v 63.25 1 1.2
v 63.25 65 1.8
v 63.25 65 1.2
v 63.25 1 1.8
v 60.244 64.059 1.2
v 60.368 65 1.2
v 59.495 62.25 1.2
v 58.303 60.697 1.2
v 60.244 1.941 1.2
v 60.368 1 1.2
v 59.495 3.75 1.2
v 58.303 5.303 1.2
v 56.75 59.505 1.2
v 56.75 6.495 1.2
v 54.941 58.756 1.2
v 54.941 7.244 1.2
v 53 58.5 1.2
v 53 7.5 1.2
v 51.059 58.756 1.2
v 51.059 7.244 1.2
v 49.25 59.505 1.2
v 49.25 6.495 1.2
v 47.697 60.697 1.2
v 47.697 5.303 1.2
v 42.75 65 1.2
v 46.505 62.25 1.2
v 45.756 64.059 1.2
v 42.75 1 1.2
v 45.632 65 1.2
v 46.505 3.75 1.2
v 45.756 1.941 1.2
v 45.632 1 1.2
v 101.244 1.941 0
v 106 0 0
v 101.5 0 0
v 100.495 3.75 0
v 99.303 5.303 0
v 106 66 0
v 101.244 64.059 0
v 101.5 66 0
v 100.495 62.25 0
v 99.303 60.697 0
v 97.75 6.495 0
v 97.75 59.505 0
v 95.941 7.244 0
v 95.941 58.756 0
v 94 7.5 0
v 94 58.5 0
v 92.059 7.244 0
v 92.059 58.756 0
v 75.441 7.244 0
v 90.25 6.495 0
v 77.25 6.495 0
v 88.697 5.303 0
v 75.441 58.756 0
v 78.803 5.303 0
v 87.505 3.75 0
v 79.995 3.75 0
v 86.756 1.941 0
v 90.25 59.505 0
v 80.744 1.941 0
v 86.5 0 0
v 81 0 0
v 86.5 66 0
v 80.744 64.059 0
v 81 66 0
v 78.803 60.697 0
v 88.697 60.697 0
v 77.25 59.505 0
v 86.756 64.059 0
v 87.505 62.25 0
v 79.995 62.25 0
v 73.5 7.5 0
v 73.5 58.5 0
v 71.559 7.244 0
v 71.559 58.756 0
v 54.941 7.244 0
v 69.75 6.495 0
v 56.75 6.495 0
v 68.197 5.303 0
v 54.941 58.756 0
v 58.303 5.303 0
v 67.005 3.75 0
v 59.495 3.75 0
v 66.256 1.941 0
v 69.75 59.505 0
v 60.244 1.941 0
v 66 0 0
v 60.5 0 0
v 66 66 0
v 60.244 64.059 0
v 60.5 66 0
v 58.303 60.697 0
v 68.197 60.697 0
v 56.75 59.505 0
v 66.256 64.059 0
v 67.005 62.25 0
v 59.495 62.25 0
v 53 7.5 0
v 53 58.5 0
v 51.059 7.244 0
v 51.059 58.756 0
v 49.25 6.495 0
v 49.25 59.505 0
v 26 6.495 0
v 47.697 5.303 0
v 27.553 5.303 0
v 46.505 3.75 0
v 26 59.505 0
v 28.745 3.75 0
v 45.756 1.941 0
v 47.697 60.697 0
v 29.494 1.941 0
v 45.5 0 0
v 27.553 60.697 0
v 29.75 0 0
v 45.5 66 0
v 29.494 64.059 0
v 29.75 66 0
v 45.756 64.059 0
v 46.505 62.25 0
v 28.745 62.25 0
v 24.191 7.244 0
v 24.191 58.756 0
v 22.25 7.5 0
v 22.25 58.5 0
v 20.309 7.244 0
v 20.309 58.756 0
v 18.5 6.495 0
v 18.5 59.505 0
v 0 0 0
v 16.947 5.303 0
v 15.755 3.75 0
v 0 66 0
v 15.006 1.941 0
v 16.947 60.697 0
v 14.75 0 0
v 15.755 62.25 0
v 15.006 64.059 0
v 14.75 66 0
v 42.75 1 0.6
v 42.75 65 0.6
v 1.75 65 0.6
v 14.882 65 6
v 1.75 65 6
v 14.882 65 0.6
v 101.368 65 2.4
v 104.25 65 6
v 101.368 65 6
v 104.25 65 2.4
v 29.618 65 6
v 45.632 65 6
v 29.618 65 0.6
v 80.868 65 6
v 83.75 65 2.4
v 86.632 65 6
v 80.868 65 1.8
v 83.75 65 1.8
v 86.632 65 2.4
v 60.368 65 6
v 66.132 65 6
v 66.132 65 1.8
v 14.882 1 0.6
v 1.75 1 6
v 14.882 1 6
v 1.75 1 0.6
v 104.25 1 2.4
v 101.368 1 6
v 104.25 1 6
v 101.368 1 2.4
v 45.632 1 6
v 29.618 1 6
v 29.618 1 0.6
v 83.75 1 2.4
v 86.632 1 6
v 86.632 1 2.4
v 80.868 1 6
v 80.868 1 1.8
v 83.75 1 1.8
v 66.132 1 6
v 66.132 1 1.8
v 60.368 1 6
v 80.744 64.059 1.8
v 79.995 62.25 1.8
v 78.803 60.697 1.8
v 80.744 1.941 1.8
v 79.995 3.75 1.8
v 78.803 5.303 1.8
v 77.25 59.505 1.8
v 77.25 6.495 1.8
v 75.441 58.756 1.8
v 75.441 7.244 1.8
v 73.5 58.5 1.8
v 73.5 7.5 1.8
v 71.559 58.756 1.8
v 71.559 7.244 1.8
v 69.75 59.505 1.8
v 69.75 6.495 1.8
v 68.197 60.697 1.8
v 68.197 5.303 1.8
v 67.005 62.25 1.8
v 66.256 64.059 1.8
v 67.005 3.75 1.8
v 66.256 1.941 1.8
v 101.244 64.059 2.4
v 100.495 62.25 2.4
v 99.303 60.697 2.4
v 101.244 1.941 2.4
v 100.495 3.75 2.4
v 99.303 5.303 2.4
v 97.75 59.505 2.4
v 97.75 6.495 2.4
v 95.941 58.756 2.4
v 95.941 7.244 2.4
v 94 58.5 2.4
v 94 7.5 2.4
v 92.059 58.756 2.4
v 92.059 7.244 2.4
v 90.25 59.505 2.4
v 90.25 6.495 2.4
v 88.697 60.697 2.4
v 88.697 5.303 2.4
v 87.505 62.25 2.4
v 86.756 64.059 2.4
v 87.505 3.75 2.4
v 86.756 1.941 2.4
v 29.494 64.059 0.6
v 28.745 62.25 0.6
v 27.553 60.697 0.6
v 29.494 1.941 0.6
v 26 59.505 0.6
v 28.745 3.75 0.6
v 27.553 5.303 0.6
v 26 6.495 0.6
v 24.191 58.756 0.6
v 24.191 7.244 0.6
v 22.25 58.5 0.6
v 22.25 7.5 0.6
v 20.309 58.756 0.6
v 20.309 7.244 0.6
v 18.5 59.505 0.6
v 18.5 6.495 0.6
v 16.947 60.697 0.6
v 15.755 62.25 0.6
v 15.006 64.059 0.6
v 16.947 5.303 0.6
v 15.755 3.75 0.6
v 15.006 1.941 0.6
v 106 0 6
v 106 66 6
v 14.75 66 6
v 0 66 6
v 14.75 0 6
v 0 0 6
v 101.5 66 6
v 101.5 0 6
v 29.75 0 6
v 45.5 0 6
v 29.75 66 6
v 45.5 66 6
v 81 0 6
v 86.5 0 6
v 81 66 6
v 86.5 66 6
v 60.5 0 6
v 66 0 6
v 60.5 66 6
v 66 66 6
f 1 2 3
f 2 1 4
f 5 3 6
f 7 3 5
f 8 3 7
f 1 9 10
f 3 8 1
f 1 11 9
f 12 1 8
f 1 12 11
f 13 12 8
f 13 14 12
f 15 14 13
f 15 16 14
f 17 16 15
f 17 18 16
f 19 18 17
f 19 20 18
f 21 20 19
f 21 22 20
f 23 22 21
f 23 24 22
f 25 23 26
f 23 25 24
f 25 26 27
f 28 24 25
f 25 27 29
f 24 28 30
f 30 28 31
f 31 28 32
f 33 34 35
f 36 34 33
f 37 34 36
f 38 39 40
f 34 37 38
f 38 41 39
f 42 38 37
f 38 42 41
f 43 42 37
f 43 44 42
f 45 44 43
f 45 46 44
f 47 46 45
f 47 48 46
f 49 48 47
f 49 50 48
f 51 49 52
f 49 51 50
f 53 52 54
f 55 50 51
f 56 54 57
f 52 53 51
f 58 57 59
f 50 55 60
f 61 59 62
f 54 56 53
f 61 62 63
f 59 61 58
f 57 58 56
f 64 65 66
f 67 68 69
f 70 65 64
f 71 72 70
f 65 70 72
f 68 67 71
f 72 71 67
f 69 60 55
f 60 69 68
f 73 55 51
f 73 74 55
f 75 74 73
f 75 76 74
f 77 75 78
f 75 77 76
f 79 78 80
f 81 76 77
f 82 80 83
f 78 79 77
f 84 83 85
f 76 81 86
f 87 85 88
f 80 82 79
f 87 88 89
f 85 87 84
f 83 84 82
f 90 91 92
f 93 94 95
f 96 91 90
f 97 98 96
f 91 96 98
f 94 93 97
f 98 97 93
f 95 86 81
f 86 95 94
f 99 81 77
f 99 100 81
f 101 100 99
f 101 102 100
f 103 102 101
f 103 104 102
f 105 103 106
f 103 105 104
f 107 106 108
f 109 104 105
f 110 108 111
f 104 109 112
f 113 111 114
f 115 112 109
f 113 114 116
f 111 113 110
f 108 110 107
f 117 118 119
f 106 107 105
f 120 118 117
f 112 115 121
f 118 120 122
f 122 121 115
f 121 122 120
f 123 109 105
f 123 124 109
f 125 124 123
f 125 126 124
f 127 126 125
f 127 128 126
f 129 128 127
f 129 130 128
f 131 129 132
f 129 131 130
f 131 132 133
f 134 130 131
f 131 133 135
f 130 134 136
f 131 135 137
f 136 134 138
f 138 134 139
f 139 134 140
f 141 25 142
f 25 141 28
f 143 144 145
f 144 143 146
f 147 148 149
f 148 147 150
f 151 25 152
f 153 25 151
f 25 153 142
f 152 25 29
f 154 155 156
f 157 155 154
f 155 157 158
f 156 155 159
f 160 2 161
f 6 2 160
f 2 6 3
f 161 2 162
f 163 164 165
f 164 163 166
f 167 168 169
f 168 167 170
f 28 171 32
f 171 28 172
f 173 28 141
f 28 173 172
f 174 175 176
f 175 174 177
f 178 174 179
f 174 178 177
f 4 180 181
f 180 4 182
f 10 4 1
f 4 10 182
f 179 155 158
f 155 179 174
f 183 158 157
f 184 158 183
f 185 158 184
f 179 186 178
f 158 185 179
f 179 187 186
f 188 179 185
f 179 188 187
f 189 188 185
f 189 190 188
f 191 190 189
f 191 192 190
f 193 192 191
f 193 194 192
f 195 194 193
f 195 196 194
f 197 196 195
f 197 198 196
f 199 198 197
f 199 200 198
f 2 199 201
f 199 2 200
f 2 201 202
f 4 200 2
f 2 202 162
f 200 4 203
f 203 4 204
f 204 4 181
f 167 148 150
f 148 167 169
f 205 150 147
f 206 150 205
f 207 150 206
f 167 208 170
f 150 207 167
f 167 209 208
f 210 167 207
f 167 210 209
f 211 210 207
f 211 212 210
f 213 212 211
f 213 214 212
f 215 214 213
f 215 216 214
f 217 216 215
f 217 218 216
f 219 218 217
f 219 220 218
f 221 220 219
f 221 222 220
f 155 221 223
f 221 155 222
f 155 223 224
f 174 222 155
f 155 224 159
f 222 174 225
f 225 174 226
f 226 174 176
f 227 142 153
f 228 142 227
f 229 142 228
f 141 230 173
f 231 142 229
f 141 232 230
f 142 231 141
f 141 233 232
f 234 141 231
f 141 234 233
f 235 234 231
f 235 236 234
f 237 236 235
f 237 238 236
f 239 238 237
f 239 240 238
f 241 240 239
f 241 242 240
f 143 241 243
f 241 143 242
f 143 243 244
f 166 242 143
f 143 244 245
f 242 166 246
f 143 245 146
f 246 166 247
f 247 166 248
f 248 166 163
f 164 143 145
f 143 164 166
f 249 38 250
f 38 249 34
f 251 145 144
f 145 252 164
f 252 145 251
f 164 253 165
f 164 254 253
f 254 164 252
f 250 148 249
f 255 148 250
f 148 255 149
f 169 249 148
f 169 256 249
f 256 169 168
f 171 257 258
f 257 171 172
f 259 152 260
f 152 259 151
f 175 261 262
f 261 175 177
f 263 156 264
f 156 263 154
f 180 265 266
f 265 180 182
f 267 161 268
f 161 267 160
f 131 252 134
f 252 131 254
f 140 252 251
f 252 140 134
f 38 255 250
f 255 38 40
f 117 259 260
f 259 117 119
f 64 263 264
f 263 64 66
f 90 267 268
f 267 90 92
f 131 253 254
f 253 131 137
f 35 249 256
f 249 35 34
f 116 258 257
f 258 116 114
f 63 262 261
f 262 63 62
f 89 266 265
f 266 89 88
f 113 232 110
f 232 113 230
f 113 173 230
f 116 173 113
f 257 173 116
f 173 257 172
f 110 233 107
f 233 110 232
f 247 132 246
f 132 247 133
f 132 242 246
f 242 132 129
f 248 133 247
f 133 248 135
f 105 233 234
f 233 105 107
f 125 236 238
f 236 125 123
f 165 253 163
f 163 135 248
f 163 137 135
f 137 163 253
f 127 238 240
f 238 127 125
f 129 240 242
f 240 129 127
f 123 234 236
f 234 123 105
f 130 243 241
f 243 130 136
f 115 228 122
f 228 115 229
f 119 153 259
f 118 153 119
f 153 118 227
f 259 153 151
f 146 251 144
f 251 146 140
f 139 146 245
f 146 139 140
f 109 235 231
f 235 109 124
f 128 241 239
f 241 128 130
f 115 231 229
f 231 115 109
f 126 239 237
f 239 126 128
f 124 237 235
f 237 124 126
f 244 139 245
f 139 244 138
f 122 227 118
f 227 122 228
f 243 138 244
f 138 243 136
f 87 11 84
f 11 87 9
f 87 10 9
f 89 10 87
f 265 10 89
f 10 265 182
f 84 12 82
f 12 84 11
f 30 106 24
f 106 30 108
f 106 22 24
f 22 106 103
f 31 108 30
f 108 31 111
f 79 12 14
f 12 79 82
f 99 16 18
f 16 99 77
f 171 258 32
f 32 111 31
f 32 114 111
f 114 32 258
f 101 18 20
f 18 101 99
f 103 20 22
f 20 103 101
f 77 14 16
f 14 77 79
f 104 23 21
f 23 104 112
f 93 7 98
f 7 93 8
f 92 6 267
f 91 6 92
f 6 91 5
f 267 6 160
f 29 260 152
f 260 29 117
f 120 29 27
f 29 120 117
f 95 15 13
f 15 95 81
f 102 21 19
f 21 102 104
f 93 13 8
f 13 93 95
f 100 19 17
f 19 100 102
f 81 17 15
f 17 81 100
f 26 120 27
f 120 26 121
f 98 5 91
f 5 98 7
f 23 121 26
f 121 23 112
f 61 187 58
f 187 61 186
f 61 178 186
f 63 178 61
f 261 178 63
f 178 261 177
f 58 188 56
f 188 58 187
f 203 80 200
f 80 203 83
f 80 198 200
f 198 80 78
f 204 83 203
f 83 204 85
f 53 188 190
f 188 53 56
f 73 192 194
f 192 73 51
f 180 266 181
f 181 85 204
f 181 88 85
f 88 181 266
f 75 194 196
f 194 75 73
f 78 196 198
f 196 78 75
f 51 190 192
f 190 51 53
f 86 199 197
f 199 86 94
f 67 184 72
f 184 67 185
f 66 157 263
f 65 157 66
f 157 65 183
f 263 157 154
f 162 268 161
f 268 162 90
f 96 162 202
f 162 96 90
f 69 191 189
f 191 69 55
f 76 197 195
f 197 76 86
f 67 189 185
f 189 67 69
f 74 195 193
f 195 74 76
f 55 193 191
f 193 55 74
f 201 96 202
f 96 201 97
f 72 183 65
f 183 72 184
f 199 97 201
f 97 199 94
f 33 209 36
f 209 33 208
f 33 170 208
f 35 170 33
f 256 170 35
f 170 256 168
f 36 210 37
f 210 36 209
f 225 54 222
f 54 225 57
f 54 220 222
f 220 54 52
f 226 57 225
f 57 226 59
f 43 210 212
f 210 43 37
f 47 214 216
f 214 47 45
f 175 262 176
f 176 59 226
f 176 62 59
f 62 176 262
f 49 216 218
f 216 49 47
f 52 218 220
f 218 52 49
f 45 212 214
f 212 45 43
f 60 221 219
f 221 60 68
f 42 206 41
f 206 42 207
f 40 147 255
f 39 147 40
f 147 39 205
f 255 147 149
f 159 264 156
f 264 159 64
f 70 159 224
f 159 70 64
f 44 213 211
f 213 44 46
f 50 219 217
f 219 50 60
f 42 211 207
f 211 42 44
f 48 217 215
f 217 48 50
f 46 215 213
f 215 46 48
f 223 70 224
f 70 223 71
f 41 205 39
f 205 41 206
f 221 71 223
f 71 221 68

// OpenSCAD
// file: damageInsert.scad
cardWidth = 41;
cardDepth = 64;
widthOffsetPercent = .5;
depthOffsetPercent = .55;
offsetCardWidth = cardWidth*widthOffsetPercent;
offsetCardDepth = cardDepth*depthOffsetPercent;
cardHeight = .3;
stepHeight = 2*cardHeight;

function getCardWidth() = cardWidth;
function getCardDepth() = cardDepth;
function getOffsetCardWidth() = offsetCardWidth;
function getOffsetCardDepth() = offsetCardDepth;
function getInsertStepHeight() = stepHeight;
function getColor(number) = [.2*number, 0*number, .2*number,];
function getMinOuterDimensions(direction, numberOfCards, insertTolerance) = direction == "depth"
  ? [
      cardWidth + insertTolerance,
      cardDepth + (numberOfCards - 1)*offsetCardDepth + insertTolerance,
      (numberOfCards + 1)*stepHeight + insertTolerance
  ]
  : [
    cardWidth + (numberOfCards - 1)*offsetCardWidth + insertTolerance,
    cardDepth + insertTolerance,
    (numberOfCards + 1)*stepHeight + insertTolerance,
  ];

module damageInsert (
  numberOfCards,
  direction = "depth",
  insertTolerance = 1
) {
  cube([cardWidth, cardDepth, stepHeight]);

  numberOfAdditionalCards = numberOfCards - 1;
  for (i = [1: numberOfAdditionalCards]) {
    color(getColor(i))
    if (direction == "depth") {
      translate([0, cardDepth + (i - 1)*offsetCardDepth, 0])
      cube([cardWidth, offsetCardDepth, (i+1)*stepHeight]);
    } else {
      translate([cardWidth + (i - 1)*offsetCardWidth, 0, 0])
      cube([offsetCardWidth, cardDepth, (i+1)*stepHeight]);
    }
  }

  echo("Min Outer Dimensions", getMinOuterDimensions(direction, numberOfCards, insertTolerance));
}

damageInsert(4, "width");
// file: ../../standard-organizers/container.scad
function defaultBottomThickness() = 1;
function defaultBottomClearance() = 16;
function defaultMinWallThickness() = 1;
function defaultWallClearance() = 16;
function defaultSideMultiple() = 2;

function getOuterWidth(innerWidth, minWallThickness, sideMultiple) = ceil((innerWidth + 2*minWallThickness)/sideMultiple)*sideMultiple;
function getOuterDepth(innerDepth, minWallThickness, sideMultiple) = ceil((innerDepth + 2*minWallThickness)/sideMultiple)*sideMultiple;

function getSideWallThickness(innerWidth, minWallThickness, sideMultiple) = (getOuterWidth(innerWidth, minWallThickness, sideMultiple) - innerWidth)/2;
function getFrontWallThickness(innerDepth, minWallThickness, sideMultiple) = (getOuterDepth(innerDepth, minWallThickness, sideMultiple) - innerDepth)/2;

function getFrontHoleWidth(innerWidth, frontWallClearance) = max(5, innerWidth - 2*frontWallClearance);
function getSideHoleDepth(innerDepth, sideWallClearance) = max(5, innerDepth - 2*sideWallClearance);

function getFrontHole(innerWidth, innerDepth, outerHeight, bottomClearance, minWallThickness, frontWallClearance, sideMultiple) = [
  [
    getSideWallThickness(innerWidth, minWallThickness, sideMultiple) + (innerWidth/2 - getFrontHoleWidth(innerWidth, frontWallClearance)/2),
    0,
    bottomClearance
  ],
  [
    getFrontHoleWidth(innerWidth, frontWallClearance),
    getOuterDepth(innerDepth, minWallThickness, sideMultiple),
    outerHeight
  ]
];

function getSideHole(innerWidth, innerDepth, outerHeight, bottomClearance, minWallThickness, sideWallClearance, sideMultiple) = [
  [
    0,
    getFrontWallThickness(innerDepth, minWallThickness, sideMultiple) + (innerDepth/2 - getSideHoleDepth(innerDepth, sideWallClearance)/2),
    bottomClearance
  ],
  [
    getOuterWidth(innerWidth, minWallThickness, sideMultiple),
    getSideHoleDepth(innerDepth, sideWallClearance),
    outerHeight
  ]
];

module container (
  innerWidth,
  innerDepth,
  outerHeight,
  type = "solid",
  bottomThickness = defaultBottomThickness(),
  bottomClearance = defaultBottomClearance(),
  minWallThickness = defaultMinWallThickness(),
  frontWallClearance = defaultWallClearance(),
  sideWallClearance = defaultWallClearance(),
  sideMultiple = defaultSideMultiple()
) {
  innerHeight = outerHeight - bottomThickness;

  outerWidth = getOuterWidth(innerWidth, minWallThickness, sideMultiple);
  outerDepth = getOuterDepth(innerDepth, minWallThickness, sideMultiple);
  sideWallThickness = getSideWallThickness(innerWidth, minWallThickness, sideMultiple);
  frontWallThickness = getFrontWallThickness(innerDepth, minWallThickness, sideMultiple);

  echo("File dimensions", innerWidth, innerDepth, outerHeight);
  echo("Outer dimensions", outerWidth, outerDepth, outerHeight);
  echo("Walls", sideWallThickness, frontWallThickness);

  baseHoleWidth = max(5, innerWidth - 2*bottomClearance);
  holeWidth = baseHoleWidth > innerWidth ? innerWidth/2 : baseHoleWidth;
  baseHoleDepth = max(5, innerDepth - 2*bottomClearance);
  holeDepth = baseHoleDepth > innerDepth ? innerDepth/2 : baseHoleDepth;
  holeX = sideWallThickness + innerWidth/2 - holeWidth/2;
  holeY = frontWallThickness + innerDepth/2 - holeDepth/2;

  frontHole = getFrontHole(
    innerWidth,
    innerDepth,
    outerHeight,
    bottomClearance,
    minWallThickness,
    frontWallClearance,
    sideMultiple
  );
  frontHolePosition = frontHole[0];
  frontHoleDimesions = frontHole[1];

  sideHole = getSideHole(
    innerWidth,
    innerDepth,
    outerHeight,
    bottomClearance,
    minWallThickness,
    sideWallClearance,
    sideMultiple
  );
  sideHolePosition = sideHole[0];
  sideHoleDimensions = sideHole[1];

  difference() {
    // Outer box
    cube([outerWidth, outerDepth, outerHeight]);

    // Inner box
    translate([sideWallThickness, frontWallThickness, bottomThickness])
    cube([innerWidth, innerDepth, innerHeight]);

    // Bottom hole
    translate([holeX, holeY, 0])
    cube([holeWidth, holeDepth, bottomThickness]);

    if(type == "hollow") {
      // Front and back hole
      translate(frontHolePosition)
      cube(frontHoleDimesions);

      // Side holes
      translate(sideHolePosition)
      cube(sideHoleDimensions);
    }
  }
}
// main file
use <../../standard-organizers/container.scad>;
use <./damageInsert.scad>;

numberOfCards = 4;
direction = "width";
holeRadius = 7.5;
outerContainerHeight = 6;
insertTolerance = 0;

containerDimensions = getMinOuterDimensions(direction, numberOfCards, insertTolerance);
innerContainerWidth = containerDimensions[0];
innerContainerDepth = containerDimensions[1];
bottomThickness = 0;
minWallThickness = defaultMinWallThickness();
sideMultiple = defaultSideMultiple();

containerFrontWallThickness = getFrontWallThickness(innerContainerDepth, minWallThickness, sideMultiple);
containerSideWallThickness = getSideWallThickness(innerContainerWidth, minWallThickness, sideMultiple);

module makeCylinders () {
  cylinder(outerContainerHeight, r = holeRadius);

  move = direction == "depth"
    ?  [2*containerSideWallThickness + innerContainerWidth, 0, 0]
    : [0, 2*containerFrontWallThickness + innerContainerDepth, 0];
  translate(move)
  cylinder(outerContainerHeight, r = holeRadius);
}

difference(){
  union(){
    translate([containerSideWallThickness, containerFrontWallThickness, 0])
    damageInsert(numberOfCards, direction, insertTolerance);

    container(
      innerContainerWidth,
      innerContainerDepth,
      outerContainerHeight,
      "solid",
      bottomThickness
    );
  }

  move0 = direction == "depth"
    ? [0, containerFrontWallThickness, 0]
    : [containerSideWallThickness, 0, 0];
  translate(move0) {
    move1 = direction == "depth"
      ? [0, getCardDepth()/2, 0]
      : [getCardWidth()/2, 0, 0];
    translate(move1){
      makeCylinders();

      // move2 = direction == "depth"
      //     ? [0, getOffsetCardDepth() - getCardDepth()/2, 0]
      //     : [(getCardWidth() - getOffsetCardWidth())/2, 0, 0];
      translate(move1) {
        for (i = [1:numberOfCards - 1]) {
          move3 = direction == "depth"
            ? [0, getOffsetCardDepth()/2 + (i-1)*getOffsetCardDepth(), 0]
            : [getOffsetCardWidth()/2 + (i-1)*getOffsetCardWidth(), 0, 0];

          translate(move3)
          makeCylinders();
        }
      }
    }
  }
}
